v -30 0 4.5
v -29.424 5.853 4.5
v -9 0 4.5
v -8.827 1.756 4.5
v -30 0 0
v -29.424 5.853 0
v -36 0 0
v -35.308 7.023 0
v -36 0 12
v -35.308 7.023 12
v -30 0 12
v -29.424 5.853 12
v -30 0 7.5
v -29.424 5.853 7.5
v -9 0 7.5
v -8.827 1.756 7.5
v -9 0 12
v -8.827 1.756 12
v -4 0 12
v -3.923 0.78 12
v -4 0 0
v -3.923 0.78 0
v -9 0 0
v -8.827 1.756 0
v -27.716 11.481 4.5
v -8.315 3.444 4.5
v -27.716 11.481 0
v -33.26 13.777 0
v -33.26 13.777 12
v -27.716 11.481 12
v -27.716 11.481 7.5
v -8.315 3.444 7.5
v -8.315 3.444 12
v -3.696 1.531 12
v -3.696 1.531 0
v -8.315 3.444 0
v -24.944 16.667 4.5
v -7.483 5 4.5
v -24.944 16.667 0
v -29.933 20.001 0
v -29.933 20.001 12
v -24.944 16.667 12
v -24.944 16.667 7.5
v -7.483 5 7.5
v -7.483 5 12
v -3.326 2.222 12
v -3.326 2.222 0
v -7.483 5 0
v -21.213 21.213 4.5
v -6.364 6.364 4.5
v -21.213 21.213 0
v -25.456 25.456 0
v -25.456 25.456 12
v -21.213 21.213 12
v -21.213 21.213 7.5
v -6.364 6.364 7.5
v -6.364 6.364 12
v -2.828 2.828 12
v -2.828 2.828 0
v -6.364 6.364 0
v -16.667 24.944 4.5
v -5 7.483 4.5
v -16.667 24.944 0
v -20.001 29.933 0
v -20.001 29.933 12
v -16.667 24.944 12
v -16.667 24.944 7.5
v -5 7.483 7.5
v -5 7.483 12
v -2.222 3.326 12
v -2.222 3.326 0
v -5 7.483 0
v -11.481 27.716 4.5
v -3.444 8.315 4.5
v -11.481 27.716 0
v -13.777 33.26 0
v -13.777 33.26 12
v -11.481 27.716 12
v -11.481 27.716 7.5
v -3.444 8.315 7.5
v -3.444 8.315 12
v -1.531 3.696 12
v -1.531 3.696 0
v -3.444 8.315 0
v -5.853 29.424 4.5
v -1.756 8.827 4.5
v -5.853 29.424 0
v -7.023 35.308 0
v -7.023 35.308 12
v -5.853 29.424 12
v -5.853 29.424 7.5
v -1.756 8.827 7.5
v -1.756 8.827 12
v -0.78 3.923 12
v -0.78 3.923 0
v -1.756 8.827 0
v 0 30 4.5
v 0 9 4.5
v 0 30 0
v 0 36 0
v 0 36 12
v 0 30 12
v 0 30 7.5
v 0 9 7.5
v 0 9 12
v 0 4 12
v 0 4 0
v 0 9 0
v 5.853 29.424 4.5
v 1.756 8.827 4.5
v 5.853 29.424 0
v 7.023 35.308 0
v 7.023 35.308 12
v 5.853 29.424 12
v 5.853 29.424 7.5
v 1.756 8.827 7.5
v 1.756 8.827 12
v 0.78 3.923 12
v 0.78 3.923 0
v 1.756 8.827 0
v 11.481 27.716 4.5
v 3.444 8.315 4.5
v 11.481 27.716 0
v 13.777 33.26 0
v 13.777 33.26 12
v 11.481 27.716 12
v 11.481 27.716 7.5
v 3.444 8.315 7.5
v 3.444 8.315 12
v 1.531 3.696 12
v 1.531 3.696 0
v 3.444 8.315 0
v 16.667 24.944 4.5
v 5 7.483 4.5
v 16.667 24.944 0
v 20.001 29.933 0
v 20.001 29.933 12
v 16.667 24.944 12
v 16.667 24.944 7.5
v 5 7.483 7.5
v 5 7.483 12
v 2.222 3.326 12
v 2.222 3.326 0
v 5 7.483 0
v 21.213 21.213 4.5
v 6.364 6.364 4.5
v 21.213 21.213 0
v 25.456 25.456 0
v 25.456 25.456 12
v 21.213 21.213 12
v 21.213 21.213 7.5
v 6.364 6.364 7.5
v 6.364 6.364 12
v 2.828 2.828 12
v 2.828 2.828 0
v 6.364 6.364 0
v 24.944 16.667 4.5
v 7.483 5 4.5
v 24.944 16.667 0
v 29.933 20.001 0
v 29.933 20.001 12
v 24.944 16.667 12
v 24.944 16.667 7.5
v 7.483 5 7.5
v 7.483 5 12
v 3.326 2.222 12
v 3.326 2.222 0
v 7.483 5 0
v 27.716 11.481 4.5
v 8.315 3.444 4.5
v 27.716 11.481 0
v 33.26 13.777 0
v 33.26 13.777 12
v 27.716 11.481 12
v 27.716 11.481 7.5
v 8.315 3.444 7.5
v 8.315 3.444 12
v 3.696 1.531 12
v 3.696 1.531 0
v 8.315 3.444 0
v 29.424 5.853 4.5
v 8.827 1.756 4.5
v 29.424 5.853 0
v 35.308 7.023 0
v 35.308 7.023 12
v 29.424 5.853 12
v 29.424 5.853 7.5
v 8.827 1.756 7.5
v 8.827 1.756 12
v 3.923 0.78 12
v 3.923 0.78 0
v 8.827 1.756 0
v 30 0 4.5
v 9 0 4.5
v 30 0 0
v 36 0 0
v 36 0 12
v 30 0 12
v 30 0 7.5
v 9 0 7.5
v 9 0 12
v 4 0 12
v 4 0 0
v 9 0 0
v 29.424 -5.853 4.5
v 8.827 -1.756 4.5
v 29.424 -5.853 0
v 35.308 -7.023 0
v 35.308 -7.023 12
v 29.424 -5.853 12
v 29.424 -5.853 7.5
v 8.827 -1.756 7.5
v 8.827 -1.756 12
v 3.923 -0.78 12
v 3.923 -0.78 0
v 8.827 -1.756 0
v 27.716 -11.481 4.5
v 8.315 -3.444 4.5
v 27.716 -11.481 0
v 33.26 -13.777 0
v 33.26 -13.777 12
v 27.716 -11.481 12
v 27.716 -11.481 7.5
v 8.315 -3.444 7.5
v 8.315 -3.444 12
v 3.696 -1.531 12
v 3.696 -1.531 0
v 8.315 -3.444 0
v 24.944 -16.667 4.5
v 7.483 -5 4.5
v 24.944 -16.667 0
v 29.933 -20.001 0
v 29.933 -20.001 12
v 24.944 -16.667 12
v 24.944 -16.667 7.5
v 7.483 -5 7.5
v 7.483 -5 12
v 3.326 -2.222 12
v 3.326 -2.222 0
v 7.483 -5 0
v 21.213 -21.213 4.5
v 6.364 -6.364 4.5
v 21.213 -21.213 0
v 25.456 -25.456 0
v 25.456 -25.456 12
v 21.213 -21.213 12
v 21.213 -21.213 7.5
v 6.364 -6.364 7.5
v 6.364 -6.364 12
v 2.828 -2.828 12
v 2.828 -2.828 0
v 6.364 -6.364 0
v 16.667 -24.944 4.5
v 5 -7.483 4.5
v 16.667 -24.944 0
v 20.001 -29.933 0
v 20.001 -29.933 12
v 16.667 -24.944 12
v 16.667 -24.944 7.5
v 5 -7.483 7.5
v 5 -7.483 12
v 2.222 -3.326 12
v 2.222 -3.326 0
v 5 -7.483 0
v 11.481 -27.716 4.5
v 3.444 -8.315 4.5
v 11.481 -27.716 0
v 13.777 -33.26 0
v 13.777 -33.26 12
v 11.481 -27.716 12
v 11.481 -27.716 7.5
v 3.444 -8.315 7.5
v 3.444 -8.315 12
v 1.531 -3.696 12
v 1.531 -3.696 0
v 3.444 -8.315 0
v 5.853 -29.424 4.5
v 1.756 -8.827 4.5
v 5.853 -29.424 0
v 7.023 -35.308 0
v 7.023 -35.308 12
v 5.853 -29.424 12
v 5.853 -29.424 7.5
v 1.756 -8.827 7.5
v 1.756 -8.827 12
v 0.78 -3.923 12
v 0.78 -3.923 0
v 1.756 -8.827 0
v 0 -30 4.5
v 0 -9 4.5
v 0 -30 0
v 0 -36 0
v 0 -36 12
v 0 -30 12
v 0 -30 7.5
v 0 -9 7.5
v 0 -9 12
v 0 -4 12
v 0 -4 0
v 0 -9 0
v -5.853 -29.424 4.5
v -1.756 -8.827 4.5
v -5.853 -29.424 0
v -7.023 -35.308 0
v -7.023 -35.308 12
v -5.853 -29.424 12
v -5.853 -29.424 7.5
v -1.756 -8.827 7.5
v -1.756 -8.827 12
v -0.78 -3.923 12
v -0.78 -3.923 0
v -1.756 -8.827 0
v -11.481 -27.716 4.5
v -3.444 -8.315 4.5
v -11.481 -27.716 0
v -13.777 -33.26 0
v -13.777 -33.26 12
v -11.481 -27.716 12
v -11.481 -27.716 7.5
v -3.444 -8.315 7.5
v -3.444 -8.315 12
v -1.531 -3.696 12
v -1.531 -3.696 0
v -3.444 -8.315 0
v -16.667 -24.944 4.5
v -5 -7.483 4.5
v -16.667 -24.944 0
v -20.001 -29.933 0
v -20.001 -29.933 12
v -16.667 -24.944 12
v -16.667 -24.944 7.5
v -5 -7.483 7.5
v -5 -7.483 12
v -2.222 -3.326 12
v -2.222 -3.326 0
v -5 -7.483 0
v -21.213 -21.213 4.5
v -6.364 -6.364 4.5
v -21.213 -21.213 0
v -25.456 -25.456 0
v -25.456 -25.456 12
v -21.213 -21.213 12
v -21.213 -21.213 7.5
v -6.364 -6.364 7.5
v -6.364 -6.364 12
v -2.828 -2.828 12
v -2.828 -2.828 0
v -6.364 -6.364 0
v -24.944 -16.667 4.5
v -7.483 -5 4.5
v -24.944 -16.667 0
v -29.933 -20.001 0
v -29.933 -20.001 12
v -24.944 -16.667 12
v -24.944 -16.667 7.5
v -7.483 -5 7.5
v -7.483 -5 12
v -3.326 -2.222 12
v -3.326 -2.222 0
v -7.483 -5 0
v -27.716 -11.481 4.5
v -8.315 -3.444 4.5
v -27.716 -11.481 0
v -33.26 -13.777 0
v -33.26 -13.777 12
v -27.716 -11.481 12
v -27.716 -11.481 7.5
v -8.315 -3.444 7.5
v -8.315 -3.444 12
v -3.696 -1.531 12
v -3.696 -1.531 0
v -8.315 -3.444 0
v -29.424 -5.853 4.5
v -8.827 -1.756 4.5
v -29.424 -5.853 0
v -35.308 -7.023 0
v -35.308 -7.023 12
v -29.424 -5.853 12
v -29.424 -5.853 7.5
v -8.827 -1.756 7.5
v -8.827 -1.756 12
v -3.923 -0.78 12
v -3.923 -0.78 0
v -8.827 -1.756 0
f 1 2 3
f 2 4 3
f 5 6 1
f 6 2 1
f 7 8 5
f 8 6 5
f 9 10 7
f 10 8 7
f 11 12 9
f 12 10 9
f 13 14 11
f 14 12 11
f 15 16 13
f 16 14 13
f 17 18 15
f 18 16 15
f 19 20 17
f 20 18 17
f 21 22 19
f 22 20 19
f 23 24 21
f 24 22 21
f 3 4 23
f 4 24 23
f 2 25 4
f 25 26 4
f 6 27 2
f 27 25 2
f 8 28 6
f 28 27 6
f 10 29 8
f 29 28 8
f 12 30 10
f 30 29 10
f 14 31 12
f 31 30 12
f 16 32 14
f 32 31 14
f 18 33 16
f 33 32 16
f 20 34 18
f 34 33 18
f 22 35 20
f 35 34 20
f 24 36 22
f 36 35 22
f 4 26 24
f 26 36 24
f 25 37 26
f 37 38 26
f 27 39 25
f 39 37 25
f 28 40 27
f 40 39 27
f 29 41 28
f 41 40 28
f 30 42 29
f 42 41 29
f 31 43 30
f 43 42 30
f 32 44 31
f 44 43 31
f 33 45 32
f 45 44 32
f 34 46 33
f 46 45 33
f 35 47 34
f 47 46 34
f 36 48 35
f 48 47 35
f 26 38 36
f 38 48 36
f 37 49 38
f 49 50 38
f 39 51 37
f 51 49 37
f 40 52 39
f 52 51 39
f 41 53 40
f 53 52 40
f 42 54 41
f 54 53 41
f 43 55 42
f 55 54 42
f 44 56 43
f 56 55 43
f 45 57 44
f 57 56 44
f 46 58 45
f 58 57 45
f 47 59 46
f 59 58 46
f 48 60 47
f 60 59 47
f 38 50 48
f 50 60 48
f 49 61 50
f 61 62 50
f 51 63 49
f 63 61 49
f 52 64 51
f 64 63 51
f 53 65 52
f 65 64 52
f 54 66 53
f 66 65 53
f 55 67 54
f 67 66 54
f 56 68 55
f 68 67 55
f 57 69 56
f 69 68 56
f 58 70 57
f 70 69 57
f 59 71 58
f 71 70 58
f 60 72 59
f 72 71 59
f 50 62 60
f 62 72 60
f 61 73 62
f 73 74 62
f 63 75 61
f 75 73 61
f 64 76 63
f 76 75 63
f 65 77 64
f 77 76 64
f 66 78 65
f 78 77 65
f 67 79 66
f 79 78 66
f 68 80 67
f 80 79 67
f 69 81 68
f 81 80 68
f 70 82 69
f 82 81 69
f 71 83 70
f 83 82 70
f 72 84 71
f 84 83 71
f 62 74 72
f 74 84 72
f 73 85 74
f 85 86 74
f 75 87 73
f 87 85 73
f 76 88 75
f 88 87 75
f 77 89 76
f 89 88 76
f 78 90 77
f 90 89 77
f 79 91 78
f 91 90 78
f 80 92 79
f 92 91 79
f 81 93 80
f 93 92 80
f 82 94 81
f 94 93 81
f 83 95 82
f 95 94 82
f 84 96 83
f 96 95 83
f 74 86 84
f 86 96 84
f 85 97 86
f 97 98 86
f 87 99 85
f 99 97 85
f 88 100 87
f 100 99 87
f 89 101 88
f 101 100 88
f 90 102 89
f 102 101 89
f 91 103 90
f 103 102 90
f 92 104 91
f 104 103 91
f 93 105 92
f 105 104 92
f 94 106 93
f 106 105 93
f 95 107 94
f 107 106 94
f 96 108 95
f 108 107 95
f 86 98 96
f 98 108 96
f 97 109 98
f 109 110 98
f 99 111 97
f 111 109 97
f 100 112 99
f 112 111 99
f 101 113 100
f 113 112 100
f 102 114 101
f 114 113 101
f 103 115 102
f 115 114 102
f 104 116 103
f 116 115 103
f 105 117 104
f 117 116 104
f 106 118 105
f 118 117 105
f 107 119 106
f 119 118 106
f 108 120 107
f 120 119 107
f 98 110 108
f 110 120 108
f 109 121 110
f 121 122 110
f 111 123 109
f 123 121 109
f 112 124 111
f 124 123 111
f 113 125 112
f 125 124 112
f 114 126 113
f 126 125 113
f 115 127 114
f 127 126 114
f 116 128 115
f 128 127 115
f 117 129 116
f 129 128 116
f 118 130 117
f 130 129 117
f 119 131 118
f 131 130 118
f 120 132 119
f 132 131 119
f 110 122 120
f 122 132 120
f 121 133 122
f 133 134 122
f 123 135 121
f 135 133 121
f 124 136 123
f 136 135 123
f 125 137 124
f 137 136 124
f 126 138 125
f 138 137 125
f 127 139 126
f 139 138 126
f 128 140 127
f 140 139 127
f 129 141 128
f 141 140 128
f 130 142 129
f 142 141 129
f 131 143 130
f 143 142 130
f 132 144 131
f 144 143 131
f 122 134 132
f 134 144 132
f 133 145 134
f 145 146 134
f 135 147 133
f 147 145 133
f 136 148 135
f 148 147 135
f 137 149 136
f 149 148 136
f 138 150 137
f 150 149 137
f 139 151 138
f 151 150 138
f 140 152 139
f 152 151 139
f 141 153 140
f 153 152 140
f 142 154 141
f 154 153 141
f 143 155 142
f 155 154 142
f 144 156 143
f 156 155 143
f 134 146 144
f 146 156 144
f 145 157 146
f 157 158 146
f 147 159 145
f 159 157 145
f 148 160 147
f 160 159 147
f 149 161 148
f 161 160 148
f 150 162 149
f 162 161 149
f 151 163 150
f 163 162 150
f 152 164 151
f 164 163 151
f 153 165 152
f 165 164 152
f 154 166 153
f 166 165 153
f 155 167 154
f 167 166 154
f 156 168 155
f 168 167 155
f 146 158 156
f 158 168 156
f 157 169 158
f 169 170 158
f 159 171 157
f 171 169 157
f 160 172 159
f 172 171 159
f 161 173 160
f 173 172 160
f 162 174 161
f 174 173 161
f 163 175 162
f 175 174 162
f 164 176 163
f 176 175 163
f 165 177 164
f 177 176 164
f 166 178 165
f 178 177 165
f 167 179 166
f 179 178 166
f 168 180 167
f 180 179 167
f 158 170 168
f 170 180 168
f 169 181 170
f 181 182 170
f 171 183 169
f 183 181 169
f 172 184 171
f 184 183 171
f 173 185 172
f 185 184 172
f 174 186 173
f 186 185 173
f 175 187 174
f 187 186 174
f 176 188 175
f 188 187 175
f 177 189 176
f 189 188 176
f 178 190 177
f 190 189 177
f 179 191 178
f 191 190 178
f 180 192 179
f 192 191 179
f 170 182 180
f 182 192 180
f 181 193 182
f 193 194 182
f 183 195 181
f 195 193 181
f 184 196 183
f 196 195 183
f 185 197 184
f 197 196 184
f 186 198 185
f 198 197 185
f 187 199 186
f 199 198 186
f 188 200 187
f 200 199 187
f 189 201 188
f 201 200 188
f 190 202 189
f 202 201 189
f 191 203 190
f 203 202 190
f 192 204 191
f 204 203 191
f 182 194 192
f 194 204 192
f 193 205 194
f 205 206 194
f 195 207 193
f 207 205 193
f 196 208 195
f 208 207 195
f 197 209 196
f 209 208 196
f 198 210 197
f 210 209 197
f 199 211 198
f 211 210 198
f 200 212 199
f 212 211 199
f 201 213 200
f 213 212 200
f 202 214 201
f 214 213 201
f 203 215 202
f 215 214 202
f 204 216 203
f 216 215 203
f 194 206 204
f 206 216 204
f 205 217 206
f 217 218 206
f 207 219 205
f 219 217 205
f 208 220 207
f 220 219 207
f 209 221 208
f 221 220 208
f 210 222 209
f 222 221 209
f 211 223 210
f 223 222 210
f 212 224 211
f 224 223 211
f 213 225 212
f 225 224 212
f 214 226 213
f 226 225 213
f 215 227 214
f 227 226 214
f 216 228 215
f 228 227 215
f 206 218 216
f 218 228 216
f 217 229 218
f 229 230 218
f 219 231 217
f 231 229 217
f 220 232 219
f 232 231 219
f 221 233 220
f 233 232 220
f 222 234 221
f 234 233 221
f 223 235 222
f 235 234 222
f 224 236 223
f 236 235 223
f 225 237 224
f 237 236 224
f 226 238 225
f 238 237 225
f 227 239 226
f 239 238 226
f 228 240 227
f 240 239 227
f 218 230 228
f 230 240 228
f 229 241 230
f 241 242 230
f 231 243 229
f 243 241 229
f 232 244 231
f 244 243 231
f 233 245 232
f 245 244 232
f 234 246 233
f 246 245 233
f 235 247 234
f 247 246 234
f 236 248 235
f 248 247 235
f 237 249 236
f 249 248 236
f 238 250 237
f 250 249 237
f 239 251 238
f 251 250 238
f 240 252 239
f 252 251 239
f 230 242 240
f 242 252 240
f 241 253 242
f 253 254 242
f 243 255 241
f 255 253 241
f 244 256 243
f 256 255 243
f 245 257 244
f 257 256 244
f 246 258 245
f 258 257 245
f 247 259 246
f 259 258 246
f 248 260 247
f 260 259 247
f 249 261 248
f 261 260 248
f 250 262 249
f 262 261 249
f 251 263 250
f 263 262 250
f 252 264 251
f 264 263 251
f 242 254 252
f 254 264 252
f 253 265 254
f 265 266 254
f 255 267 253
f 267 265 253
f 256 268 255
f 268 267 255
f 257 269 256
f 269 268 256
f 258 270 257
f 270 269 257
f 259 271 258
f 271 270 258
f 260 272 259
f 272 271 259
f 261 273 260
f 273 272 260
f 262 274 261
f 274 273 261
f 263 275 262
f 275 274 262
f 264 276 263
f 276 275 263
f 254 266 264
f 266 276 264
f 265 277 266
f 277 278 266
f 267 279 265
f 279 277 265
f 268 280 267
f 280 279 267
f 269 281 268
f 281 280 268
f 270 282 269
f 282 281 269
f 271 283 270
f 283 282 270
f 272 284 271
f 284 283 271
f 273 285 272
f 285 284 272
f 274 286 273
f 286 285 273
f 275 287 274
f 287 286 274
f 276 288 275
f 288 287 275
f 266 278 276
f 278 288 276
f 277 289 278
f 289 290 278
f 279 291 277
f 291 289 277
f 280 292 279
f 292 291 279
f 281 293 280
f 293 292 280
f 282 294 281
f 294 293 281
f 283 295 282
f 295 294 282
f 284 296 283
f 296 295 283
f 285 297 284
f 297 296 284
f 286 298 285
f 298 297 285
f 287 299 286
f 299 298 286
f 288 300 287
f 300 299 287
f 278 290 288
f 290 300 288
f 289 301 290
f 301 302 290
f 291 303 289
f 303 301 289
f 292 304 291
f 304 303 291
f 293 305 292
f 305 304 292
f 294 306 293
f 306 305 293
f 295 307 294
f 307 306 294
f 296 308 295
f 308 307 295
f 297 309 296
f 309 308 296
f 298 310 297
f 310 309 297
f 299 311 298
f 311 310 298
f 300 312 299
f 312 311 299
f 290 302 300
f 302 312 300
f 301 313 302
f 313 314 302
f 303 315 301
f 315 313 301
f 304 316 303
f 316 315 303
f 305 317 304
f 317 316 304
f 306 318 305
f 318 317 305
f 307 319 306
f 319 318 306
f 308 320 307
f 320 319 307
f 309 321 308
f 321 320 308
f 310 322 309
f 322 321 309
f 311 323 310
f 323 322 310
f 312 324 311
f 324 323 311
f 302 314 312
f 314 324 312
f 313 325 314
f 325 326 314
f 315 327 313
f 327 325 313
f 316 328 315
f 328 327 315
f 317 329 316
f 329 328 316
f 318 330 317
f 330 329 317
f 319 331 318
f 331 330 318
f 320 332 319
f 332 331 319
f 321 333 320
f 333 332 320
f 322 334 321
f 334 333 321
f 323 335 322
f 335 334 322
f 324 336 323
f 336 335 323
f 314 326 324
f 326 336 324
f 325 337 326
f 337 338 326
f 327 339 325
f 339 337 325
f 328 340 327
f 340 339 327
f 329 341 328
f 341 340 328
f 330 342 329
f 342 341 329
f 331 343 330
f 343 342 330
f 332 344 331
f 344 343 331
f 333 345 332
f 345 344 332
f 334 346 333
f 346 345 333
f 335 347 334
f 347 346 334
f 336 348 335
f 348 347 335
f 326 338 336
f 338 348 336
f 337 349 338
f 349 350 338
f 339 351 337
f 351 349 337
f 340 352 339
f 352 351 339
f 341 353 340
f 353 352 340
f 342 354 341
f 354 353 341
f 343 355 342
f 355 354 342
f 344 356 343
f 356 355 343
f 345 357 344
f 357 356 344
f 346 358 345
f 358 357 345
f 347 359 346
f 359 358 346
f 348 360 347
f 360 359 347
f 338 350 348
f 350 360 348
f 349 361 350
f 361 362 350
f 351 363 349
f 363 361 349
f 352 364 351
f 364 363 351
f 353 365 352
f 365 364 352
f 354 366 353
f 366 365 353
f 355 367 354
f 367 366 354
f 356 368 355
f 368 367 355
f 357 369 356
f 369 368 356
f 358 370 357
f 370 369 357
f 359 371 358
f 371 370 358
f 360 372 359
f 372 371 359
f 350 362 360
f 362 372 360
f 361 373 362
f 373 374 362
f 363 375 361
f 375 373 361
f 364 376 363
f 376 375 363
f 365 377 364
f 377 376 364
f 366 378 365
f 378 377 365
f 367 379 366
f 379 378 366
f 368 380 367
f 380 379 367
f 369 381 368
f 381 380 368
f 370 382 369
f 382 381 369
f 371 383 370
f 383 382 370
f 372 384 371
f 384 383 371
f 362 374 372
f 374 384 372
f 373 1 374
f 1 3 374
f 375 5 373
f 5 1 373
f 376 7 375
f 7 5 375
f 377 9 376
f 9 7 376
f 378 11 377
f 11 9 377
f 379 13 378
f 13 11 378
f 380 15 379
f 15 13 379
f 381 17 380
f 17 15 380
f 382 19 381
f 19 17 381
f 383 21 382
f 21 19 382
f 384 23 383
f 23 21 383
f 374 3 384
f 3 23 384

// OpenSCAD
$fn = 32;

// ----------------------------------------------------------------------
// Revolved part: handwheel R36
// ----------------------------------------------------------------------

// --- parameters (mm) ---
bore_r = 4;               // bore radius
rim_r = 36;               // rim radius
rim_w = 6;                // rim axial width
rim_t = 12;               // rim diameter height
hub_r = 9;                // hub radius
web_t = 3;                // web thickness
revolve_angle = 360;      // revolve sweep, degrees

bore_d = 2 * bore_r;
rim_d = 2 * rim_r;
hub_d = 2 * hub_r;

profile = [[4, 0], [9, 0], [9, 4.5], [30, 4.5], [30, 0], [36, 0], [36, 12], [30, 12], [30, 7.5], [9, 7.5], [9, 12], [4, 12]];  // primary outline, 12 points, counter clockwise

// --- the one profile operation ---
rotate_extrude(angle = revolve_angle) polygon(points = profile);
